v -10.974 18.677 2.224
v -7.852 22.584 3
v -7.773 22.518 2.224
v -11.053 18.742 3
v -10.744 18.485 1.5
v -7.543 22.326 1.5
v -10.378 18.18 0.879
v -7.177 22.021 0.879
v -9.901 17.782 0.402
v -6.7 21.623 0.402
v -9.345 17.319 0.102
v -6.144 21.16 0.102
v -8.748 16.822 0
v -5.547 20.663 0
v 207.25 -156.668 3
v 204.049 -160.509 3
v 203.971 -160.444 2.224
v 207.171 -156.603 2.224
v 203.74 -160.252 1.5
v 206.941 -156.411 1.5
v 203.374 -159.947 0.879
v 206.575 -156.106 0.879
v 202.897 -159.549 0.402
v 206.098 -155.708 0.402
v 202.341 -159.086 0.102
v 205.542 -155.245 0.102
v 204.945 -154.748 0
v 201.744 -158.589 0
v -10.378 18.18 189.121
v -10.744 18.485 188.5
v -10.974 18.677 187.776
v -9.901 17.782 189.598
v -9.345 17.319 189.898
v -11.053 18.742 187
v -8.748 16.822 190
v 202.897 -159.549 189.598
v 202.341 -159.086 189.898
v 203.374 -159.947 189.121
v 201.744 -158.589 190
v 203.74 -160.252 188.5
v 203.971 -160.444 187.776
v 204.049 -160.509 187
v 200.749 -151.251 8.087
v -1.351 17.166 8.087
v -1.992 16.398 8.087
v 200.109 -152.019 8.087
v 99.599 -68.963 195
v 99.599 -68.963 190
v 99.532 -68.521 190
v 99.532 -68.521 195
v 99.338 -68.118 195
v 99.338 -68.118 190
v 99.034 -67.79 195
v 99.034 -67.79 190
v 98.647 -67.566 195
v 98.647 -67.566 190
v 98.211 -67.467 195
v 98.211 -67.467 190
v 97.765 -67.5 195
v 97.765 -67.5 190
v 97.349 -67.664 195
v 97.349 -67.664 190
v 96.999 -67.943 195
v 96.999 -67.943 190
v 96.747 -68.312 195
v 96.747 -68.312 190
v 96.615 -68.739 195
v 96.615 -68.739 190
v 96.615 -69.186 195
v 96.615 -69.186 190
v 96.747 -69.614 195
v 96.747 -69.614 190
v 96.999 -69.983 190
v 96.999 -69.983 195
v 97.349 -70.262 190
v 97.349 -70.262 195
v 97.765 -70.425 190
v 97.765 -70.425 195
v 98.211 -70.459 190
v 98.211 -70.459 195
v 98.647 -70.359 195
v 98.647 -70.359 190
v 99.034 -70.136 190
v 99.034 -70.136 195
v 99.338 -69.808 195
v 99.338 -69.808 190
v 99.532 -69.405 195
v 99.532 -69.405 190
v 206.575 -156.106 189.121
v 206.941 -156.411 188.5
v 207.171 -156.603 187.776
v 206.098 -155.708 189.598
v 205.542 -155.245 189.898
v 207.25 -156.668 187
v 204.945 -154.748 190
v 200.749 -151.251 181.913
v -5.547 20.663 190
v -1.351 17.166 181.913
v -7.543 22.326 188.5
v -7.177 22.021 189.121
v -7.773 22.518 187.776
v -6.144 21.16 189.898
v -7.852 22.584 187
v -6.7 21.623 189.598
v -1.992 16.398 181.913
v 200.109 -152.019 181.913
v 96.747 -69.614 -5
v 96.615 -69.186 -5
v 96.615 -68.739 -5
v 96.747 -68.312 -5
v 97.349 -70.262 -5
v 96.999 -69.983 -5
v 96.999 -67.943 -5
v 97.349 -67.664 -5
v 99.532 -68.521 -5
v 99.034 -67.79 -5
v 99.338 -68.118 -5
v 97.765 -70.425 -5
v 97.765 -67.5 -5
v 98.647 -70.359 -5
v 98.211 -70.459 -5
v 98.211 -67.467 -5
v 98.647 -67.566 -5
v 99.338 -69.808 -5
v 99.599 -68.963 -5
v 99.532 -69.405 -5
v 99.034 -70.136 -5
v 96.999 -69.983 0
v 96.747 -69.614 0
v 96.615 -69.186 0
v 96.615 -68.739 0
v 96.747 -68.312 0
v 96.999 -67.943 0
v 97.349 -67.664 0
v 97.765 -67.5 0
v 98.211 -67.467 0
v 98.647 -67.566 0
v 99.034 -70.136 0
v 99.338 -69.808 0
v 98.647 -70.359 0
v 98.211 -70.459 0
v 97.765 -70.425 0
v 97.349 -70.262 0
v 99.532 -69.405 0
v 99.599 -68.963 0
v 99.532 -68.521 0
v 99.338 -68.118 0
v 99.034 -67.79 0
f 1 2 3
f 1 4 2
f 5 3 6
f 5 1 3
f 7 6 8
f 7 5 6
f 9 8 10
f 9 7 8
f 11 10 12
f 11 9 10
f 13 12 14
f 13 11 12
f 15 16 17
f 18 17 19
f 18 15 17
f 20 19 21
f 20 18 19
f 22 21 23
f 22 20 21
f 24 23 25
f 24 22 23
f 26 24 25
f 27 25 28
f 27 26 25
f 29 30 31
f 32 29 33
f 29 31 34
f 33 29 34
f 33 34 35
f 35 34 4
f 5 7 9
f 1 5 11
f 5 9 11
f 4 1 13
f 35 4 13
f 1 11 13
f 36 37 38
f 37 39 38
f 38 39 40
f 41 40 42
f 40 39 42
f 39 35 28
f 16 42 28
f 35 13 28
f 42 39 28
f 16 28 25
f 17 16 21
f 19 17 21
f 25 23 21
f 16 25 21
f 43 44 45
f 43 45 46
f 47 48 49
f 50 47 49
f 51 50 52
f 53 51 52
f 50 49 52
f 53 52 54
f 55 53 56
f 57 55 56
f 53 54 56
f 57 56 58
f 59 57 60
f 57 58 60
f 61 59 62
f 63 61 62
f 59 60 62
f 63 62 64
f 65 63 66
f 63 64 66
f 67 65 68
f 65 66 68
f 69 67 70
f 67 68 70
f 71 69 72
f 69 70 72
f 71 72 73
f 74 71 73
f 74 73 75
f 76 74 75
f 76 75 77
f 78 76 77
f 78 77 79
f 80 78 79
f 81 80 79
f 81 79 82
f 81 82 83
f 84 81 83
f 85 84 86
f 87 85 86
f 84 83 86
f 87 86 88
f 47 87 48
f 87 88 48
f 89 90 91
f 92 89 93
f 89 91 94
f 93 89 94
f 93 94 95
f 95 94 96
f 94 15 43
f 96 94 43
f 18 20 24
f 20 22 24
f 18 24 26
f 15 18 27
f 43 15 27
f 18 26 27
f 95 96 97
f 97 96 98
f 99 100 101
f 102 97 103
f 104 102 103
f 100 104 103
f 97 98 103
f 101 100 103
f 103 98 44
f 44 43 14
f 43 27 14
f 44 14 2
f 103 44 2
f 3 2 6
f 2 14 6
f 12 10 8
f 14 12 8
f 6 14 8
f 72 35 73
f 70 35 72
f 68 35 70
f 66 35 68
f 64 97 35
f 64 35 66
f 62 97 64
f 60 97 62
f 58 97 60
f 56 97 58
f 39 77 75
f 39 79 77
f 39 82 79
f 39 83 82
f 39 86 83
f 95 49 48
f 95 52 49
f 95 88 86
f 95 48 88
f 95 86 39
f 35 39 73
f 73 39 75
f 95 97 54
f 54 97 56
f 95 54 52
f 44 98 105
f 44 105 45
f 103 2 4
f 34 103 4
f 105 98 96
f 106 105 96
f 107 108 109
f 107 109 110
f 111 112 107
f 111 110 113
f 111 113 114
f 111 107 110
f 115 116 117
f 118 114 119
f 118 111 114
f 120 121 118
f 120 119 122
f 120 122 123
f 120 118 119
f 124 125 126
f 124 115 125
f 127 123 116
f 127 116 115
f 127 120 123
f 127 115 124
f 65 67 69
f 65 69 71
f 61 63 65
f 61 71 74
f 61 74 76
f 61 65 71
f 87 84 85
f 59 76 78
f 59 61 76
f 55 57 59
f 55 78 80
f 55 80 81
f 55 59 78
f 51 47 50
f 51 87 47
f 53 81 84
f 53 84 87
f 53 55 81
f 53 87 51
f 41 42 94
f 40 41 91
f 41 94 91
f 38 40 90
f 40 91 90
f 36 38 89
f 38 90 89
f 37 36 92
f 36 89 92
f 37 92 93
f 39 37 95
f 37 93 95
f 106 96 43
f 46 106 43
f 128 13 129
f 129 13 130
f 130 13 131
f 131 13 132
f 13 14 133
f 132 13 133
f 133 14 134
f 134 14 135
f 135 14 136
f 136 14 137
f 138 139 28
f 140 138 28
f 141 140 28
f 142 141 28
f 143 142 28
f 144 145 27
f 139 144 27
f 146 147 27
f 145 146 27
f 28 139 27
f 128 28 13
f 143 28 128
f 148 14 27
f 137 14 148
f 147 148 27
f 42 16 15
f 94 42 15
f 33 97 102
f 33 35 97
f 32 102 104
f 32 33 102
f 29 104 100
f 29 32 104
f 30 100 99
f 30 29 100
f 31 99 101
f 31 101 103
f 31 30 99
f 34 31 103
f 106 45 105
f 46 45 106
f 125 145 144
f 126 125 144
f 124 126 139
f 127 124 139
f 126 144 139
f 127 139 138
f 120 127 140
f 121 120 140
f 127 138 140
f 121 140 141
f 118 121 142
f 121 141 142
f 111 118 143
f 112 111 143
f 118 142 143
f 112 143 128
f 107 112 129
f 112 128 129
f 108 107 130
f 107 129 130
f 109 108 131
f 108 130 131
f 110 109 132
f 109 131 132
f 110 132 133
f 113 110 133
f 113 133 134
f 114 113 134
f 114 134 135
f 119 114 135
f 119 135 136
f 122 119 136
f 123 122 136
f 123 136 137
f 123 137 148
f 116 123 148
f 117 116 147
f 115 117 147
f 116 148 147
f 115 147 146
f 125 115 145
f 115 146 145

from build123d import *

# Parameters (mm, degrees)
EXTRUDE_1_DEPTH     = 190
FILLET_1_R          = 3
FILLET_2_R          = 3
FILLET_3_R          = 3
FILLET_4_R          = 3
SKETCH_2_W          = 263.076218716
SKETCH_2_H          = 173.825805258
CUT_EXTRUDE_1_DEPTH = 1
SKETCH_3_R          = 1.5
EXTRUDE_2_DEPTH     = 5
SKETCH_4_R          = 1.5
EXTRUDE_3_DEPTH     = 5


with BuildPart() as part:
    # 草图1 → 凸台-拉伸1 (new body)
    with BuildSketch(Plane.XY):
        Polygon((-7.851986906, 22.583577614), (-11.052908905, 18.742471216), (204.049049383, -160.50916069), (207.249971381, -156.668054292), align=None)
    extrude(amount=EXTRUDE_1_DEPTH)

    # 圆角1
    fillet_1_edges = [part.edges().sort_by_distance(p)[0] for p in [
        (205.649510382, -158.588607491, 0),
    ]]
    fillet(fillet_1_edges, radius=FILLET_1_R)

    # 圆角2
    fillet_2_edges = [part.edges().sort_by_distance(p)[0] for p in [
        (205.649510382, -158.588607491, 190),
    ]]
    fillet(fillet_2_edges, radius=FILLET_2_R)

    # 圆角3
    fillet_3_edges = [part.edges().sort_by_distance(p)[0] for p in [
        (-9.452447905, 20.663024415, 190),
    ]]
    fillet(fillet_3_edges, radius=FILLET_3_R)

    # 圆角4
    fillet_4_edges = [part.edges().sort_by_distance(p)[0] for p in [
        (-9.452447905, 20.663024415, 0),
    ]]
    fillet(fillet_4_edges, radius=FILLET_4_R)

    # 草图2 → 切除-拉伸1 (cut)
    with BuildSketch(Plane(origin=(7.888650095, 9.466380114, 0), x_dir=(0.76822128, -0.6401844, 0), z_dir=(0.6401844, 0.76822128, 0))):
        with Locations((119.510282494, -95)):
            Rectangle(SKETCH_2_W, SKETCH_2_H)
    extrude(amount=-CUT_EXTRUDE_1_DEPTH, mode=Mode.SUBTRACT)

    # 草图3 → 凸台-拉伸2 (add)
    with BuildSketch(Plane(origin=(0, 0, 0), x_dir=(-1, 0, 0), z_dir=(0, 0, -1))):
        with Locations(Location((-98.098531238, -68.962791538, 0), (0, 0, 180))):  # turned: the seam where the file's is
            Circle(SKETCH_3_R)
    extrude(amount=EXTRUDE_2_DEPTH)

    # 草图4 → 凸台-拉伸3 (add)
    with BuildSketch(Plane.XY.offset(190)):
        with Locations((98.098531238, -68.962791538)):
            Circle(SKETCH_4_R)
    extrude(amount=EXTRUDE_3_DEPTH)


solid = part.part
